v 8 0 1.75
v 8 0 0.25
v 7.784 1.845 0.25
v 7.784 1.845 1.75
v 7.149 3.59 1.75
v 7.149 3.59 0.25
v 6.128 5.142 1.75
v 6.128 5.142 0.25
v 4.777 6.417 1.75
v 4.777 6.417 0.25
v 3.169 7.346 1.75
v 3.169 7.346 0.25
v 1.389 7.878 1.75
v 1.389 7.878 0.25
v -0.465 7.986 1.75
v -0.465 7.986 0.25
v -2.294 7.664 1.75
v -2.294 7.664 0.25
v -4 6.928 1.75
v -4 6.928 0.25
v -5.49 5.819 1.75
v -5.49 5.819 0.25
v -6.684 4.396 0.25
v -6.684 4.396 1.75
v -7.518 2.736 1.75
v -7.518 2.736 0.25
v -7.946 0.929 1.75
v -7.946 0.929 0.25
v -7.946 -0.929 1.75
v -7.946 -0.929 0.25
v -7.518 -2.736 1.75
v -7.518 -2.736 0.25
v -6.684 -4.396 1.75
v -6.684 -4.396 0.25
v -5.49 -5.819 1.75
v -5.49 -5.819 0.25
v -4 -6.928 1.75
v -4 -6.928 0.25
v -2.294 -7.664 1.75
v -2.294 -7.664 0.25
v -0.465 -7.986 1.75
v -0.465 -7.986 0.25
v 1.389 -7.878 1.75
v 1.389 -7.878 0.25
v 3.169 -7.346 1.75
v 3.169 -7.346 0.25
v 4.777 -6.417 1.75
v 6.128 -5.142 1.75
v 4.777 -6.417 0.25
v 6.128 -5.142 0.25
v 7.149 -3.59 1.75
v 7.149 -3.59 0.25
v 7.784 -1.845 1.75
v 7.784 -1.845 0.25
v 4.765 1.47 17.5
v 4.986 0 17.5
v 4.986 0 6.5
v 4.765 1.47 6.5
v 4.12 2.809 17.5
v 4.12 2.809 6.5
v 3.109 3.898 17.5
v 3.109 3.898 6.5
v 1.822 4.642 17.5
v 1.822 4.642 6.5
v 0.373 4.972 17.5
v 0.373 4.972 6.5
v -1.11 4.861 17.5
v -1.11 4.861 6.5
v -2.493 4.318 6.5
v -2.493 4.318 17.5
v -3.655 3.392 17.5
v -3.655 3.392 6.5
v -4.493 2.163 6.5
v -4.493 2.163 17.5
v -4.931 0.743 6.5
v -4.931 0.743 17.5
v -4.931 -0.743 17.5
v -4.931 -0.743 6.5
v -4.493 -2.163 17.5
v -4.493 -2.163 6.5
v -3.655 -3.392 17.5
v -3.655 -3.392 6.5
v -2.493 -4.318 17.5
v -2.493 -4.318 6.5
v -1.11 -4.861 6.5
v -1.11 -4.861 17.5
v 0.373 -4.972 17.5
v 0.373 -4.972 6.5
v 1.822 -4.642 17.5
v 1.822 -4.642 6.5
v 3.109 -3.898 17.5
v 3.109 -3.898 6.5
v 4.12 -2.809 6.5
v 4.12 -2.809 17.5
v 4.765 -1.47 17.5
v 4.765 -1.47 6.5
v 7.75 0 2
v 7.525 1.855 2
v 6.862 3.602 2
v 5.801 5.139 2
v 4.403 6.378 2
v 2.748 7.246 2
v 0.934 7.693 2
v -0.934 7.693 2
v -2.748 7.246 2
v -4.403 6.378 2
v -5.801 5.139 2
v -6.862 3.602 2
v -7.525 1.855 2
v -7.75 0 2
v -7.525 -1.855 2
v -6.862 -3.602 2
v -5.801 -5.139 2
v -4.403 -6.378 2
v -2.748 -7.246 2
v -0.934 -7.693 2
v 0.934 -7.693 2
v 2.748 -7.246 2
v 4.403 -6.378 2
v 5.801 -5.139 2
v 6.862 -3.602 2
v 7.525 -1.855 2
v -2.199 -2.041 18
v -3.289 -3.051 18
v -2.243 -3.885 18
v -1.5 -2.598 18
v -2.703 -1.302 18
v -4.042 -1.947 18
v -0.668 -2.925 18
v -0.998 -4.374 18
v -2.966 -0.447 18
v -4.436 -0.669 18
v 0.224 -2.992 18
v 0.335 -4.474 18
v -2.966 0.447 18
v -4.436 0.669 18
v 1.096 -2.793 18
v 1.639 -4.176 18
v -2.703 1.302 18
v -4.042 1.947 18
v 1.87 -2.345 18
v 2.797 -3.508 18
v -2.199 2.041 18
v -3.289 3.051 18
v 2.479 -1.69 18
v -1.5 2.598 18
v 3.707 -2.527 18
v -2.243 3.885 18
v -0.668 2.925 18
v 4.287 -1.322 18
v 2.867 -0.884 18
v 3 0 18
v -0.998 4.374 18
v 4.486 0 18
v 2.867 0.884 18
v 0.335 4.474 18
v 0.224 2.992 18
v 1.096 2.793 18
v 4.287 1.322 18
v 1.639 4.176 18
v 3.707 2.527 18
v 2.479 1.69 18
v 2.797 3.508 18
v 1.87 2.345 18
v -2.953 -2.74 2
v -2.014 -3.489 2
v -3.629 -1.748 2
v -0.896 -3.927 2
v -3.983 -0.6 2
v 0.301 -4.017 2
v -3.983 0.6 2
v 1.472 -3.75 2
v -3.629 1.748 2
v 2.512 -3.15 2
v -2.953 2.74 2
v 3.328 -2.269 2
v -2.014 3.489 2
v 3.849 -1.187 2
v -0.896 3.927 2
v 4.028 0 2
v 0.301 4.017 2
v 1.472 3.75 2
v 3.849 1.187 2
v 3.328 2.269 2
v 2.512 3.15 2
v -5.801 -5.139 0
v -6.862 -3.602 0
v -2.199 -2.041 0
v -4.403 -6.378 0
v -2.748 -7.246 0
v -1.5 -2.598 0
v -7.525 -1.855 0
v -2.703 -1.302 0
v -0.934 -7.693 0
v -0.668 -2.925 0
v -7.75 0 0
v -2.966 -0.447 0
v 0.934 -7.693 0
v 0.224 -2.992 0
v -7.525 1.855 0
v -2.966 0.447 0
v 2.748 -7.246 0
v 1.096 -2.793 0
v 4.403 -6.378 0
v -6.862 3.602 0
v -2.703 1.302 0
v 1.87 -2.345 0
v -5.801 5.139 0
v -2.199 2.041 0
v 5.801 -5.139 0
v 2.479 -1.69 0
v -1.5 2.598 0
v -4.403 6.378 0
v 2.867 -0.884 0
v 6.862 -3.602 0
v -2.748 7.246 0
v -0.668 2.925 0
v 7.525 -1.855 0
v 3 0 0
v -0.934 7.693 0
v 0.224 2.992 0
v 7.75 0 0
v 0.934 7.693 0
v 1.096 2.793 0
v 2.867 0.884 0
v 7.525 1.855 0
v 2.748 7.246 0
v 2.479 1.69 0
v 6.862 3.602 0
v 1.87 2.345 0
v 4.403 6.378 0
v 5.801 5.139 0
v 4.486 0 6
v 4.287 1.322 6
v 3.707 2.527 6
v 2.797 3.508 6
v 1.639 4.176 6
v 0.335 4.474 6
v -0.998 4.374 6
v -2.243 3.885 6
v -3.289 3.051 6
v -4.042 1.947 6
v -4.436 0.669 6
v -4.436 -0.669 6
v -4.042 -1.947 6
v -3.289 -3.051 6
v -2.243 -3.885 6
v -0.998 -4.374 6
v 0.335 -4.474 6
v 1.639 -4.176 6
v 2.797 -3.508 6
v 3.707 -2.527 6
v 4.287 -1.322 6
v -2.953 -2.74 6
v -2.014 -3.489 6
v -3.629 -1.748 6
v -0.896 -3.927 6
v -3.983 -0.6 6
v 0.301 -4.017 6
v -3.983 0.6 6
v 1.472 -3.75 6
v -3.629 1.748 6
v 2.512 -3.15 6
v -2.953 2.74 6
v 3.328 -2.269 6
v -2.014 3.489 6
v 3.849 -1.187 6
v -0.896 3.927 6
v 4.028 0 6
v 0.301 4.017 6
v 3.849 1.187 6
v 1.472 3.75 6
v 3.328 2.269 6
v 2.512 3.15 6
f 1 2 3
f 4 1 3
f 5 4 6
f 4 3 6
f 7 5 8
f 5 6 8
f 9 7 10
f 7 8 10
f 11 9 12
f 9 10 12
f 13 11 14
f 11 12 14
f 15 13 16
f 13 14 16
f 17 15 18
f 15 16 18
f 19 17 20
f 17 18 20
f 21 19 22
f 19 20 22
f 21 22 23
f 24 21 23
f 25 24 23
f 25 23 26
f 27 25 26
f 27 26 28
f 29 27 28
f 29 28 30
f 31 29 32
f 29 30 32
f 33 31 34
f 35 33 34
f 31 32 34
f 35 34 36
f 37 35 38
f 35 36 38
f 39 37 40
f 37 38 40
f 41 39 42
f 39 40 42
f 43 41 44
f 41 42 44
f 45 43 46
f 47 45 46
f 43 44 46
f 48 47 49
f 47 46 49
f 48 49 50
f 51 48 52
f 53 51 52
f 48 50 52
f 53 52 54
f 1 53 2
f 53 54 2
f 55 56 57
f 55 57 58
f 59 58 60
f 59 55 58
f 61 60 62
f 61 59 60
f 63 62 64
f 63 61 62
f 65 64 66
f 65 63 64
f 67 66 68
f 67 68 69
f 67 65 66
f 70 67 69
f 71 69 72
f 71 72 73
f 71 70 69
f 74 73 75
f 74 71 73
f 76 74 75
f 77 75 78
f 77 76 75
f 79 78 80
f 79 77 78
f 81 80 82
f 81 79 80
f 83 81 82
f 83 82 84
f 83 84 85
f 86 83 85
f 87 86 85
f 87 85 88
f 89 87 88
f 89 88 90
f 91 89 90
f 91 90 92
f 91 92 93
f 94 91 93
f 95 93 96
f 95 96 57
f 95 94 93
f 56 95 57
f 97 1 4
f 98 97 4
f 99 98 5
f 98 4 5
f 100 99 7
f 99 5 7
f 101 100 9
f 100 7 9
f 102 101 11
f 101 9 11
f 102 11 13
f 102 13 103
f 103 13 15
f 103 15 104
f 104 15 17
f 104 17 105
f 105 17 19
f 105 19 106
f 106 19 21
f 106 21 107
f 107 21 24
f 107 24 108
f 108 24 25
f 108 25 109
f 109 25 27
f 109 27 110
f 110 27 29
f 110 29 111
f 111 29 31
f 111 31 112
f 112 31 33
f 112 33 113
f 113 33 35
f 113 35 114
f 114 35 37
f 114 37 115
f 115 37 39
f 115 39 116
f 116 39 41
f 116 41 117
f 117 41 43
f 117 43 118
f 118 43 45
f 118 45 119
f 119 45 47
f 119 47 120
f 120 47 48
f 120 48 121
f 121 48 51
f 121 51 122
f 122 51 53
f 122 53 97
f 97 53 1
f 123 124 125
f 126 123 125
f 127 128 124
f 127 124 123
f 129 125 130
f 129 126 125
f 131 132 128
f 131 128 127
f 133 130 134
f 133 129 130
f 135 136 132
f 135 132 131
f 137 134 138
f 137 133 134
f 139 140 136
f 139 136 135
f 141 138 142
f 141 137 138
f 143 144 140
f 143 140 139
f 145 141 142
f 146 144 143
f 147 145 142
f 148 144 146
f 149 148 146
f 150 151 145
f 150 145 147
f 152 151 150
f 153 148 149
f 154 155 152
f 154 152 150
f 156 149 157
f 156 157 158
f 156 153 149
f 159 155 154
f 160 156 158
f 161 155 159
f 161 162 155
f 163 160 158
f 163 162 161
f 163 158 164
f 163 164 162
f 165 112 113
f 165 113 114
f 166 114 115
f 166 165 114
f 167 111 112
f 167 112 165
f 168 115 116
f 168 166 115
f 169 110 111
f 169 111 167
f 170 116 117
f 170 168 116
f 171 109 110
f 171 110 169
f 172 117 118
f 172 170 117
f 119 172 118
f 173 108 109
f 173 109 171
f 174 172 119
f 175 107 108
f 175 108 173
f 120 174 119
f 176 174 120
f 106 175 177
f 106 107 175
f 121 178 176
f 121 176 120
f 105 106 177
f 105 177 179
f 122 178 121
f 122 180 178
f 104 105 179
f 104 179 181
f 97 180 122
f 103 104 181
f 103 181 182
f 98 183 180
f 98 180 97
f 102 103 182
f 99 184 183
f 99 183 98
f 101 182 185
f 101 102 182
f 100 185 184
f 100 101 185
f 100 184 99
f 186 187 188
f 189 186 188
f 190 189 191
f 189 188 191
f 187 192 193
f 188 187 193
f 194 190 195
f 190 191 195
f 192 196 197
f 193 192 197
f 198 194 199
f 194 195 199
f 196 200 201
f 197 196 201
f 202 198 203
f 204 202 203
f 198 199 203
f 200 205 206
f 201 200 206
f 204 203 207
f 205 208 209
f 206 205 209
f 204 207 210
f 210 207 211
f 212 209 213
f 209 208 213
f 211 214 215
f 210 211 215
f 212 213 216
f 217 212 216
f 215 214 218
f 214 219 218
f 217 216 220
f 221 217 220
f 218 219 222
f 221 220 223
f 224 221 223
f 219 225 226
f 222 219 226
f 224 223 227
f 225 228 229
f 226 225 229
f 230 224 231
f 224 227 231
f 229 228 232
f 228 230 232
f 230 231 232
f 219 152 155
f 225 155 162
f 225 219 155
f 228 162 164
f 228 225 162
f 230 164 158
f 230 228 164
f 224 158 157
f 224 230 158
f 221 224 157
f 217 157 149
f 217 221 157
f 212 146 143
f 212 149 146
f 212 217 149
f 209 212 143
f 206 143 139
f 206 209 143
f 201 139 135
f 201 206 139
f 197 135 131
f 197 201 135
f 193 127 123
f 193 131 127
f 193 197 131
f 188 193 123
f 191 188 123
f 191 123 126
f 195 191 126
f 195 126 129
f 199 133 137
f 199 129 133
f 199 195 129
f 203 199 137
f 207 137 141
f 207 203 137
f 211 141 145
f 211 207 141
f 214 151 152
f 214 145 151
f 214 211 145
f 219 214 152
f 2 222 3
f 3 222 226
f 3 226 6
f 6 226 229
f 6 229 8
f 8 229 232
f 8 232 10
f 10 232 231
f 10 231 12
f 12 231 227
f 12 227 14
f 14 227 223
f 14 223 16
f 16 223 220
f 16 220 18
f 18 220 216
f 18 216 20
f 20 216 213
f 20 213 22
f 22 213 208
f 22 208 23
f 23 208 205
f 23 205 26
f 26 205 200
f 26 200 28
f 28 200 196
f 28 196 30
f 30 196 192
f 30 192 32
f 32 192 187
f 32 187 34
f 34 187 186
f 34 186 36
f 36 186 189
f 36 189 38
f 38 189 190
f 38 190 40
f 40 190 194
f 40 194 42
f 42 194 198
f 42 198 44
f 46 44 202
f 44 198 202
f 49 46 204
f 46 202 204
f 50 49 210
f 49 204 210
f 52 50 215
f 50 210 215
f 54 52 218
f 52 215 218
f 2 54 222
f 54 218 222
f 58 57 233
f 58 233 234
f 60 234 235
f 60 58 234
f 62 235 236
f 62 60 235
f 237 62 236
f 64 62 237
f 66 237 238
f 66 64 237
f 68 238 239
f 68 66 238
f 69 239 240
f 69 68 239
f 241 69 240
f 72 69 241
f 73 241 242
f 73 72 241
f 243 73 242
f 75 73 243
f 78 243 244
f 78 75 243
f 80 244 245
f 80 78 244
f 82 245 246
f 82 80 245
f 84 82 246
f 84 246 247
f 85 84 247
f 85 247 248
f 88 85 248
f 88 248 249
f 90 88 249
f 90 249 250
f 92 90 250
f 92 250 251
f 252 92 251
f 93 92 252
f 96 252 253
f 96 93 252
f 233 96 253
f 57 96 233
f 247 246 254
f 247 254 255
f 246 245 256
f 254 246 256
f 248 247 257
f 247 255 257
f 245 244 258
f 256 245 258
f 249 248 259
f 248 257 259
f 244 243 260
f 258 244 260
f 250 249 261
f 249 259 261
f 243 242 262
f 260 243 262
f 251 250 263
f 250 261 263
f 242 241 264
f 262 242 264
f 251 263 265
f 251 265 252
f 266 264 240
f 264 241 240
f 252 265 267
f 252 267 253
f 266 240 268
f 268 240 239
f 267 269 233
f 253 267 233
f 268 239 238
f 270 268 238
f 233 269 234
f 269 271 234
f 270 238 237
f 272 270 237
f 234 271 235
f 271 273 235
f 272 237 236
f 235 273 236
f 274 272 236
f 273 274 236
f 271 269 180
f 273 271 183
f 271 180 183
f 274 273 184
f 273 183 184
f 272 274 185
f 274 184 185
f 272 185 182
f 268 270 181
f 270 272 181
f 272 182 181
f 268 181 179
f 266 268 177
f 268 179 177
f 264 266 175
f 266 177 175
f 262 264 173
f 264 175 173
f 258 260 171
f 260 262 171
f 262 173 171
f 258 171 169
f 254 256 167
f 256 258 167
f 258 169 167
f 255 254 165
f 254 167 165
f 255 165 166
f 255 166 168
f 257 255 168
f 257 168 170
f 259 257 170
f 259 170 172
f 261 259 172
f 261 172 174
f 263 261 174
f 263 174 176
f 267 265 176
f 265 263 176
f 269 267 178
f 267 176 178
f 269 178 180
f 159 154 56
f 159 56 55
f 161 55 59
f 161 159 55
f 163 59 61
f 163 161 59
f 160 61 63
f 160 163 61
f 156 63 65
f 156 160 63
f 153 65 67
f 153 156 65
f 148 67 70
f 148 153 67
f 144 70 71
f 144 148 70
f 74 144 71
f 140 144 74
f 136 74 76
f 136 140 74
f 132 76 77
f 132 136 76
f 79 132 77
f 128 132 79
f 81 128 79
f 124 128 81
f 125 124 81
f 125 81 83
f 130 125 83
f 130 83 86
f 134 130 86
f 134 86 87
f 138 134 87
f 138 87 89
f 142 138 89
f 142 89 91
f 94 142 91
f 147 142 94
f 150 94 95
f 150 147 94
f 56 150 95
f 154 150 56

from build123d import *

# Parameters (mm, degrees)
F0_R     = 8
F0_R_2   = 4.986346
F0_R_3   = 4.028364
F1_DEPTH = 2
F0_R_4   = 3
F2_DEPTH = 18
F3_R     = 4.986346
F4_DEPTH = 12
F5_DEPTH = 44.1
F6_SIZE  = 0.25
F7_SIZE  = 0.5


with BuildPart() as f1:
    # F0 (on Top) → F1 (new body)
    with BuildSketch(Plane.XY):
        Circle(F0_R)
        Circle(F0_R_2, mode=Mode.SUBTRACT)
        Circle(F0_R_2)
        Circle(F0_R_3, mode=Mode.SUBTRACT)
    extrude(amount=F1_DEPTH)

    # F0 (on Top) → F2 (join)
    with BuildSketch(Plane.XY):
        Circle(F0_R_4)
        Circle(F0_R_3)
        Circle(F0_R_4, mode=Mode.SUBTRACT)
    extrude(amount=F2_DEPTH)

    # F3 (on face) → F4 (join)
    with BuildSketch(Plane.XY.offset(18)):
        Circle(F3_R)
    extrude(amount=-F4_DEPTH)

    # F0 (on Top) → F5 (cut)
    with BuildSketch(Plane.XY):
        Circle(F0_R_4)
    extrude(amount=F5_DEPTH, mode=Mode.SUBTRACT)

    # F6
    f6_edges = [f1.edges().sort_by_distance(p)[0] for p in [
        (8, 0, 1),
        (-8, 0, 0),
        (-8, 0, 2),
    ]]
    chamfer(f6_edges, length=F6_SIZE)

    # F7
    f7_edges = [f1.edges().sort_by_distance(p)[0] for p in [
        (-4.986346, 0, 6),
        (-4.986346, 0, 18),
    ]]
    chamfer(f7_edges, length=F7_SIZE)


solid = f1.part
